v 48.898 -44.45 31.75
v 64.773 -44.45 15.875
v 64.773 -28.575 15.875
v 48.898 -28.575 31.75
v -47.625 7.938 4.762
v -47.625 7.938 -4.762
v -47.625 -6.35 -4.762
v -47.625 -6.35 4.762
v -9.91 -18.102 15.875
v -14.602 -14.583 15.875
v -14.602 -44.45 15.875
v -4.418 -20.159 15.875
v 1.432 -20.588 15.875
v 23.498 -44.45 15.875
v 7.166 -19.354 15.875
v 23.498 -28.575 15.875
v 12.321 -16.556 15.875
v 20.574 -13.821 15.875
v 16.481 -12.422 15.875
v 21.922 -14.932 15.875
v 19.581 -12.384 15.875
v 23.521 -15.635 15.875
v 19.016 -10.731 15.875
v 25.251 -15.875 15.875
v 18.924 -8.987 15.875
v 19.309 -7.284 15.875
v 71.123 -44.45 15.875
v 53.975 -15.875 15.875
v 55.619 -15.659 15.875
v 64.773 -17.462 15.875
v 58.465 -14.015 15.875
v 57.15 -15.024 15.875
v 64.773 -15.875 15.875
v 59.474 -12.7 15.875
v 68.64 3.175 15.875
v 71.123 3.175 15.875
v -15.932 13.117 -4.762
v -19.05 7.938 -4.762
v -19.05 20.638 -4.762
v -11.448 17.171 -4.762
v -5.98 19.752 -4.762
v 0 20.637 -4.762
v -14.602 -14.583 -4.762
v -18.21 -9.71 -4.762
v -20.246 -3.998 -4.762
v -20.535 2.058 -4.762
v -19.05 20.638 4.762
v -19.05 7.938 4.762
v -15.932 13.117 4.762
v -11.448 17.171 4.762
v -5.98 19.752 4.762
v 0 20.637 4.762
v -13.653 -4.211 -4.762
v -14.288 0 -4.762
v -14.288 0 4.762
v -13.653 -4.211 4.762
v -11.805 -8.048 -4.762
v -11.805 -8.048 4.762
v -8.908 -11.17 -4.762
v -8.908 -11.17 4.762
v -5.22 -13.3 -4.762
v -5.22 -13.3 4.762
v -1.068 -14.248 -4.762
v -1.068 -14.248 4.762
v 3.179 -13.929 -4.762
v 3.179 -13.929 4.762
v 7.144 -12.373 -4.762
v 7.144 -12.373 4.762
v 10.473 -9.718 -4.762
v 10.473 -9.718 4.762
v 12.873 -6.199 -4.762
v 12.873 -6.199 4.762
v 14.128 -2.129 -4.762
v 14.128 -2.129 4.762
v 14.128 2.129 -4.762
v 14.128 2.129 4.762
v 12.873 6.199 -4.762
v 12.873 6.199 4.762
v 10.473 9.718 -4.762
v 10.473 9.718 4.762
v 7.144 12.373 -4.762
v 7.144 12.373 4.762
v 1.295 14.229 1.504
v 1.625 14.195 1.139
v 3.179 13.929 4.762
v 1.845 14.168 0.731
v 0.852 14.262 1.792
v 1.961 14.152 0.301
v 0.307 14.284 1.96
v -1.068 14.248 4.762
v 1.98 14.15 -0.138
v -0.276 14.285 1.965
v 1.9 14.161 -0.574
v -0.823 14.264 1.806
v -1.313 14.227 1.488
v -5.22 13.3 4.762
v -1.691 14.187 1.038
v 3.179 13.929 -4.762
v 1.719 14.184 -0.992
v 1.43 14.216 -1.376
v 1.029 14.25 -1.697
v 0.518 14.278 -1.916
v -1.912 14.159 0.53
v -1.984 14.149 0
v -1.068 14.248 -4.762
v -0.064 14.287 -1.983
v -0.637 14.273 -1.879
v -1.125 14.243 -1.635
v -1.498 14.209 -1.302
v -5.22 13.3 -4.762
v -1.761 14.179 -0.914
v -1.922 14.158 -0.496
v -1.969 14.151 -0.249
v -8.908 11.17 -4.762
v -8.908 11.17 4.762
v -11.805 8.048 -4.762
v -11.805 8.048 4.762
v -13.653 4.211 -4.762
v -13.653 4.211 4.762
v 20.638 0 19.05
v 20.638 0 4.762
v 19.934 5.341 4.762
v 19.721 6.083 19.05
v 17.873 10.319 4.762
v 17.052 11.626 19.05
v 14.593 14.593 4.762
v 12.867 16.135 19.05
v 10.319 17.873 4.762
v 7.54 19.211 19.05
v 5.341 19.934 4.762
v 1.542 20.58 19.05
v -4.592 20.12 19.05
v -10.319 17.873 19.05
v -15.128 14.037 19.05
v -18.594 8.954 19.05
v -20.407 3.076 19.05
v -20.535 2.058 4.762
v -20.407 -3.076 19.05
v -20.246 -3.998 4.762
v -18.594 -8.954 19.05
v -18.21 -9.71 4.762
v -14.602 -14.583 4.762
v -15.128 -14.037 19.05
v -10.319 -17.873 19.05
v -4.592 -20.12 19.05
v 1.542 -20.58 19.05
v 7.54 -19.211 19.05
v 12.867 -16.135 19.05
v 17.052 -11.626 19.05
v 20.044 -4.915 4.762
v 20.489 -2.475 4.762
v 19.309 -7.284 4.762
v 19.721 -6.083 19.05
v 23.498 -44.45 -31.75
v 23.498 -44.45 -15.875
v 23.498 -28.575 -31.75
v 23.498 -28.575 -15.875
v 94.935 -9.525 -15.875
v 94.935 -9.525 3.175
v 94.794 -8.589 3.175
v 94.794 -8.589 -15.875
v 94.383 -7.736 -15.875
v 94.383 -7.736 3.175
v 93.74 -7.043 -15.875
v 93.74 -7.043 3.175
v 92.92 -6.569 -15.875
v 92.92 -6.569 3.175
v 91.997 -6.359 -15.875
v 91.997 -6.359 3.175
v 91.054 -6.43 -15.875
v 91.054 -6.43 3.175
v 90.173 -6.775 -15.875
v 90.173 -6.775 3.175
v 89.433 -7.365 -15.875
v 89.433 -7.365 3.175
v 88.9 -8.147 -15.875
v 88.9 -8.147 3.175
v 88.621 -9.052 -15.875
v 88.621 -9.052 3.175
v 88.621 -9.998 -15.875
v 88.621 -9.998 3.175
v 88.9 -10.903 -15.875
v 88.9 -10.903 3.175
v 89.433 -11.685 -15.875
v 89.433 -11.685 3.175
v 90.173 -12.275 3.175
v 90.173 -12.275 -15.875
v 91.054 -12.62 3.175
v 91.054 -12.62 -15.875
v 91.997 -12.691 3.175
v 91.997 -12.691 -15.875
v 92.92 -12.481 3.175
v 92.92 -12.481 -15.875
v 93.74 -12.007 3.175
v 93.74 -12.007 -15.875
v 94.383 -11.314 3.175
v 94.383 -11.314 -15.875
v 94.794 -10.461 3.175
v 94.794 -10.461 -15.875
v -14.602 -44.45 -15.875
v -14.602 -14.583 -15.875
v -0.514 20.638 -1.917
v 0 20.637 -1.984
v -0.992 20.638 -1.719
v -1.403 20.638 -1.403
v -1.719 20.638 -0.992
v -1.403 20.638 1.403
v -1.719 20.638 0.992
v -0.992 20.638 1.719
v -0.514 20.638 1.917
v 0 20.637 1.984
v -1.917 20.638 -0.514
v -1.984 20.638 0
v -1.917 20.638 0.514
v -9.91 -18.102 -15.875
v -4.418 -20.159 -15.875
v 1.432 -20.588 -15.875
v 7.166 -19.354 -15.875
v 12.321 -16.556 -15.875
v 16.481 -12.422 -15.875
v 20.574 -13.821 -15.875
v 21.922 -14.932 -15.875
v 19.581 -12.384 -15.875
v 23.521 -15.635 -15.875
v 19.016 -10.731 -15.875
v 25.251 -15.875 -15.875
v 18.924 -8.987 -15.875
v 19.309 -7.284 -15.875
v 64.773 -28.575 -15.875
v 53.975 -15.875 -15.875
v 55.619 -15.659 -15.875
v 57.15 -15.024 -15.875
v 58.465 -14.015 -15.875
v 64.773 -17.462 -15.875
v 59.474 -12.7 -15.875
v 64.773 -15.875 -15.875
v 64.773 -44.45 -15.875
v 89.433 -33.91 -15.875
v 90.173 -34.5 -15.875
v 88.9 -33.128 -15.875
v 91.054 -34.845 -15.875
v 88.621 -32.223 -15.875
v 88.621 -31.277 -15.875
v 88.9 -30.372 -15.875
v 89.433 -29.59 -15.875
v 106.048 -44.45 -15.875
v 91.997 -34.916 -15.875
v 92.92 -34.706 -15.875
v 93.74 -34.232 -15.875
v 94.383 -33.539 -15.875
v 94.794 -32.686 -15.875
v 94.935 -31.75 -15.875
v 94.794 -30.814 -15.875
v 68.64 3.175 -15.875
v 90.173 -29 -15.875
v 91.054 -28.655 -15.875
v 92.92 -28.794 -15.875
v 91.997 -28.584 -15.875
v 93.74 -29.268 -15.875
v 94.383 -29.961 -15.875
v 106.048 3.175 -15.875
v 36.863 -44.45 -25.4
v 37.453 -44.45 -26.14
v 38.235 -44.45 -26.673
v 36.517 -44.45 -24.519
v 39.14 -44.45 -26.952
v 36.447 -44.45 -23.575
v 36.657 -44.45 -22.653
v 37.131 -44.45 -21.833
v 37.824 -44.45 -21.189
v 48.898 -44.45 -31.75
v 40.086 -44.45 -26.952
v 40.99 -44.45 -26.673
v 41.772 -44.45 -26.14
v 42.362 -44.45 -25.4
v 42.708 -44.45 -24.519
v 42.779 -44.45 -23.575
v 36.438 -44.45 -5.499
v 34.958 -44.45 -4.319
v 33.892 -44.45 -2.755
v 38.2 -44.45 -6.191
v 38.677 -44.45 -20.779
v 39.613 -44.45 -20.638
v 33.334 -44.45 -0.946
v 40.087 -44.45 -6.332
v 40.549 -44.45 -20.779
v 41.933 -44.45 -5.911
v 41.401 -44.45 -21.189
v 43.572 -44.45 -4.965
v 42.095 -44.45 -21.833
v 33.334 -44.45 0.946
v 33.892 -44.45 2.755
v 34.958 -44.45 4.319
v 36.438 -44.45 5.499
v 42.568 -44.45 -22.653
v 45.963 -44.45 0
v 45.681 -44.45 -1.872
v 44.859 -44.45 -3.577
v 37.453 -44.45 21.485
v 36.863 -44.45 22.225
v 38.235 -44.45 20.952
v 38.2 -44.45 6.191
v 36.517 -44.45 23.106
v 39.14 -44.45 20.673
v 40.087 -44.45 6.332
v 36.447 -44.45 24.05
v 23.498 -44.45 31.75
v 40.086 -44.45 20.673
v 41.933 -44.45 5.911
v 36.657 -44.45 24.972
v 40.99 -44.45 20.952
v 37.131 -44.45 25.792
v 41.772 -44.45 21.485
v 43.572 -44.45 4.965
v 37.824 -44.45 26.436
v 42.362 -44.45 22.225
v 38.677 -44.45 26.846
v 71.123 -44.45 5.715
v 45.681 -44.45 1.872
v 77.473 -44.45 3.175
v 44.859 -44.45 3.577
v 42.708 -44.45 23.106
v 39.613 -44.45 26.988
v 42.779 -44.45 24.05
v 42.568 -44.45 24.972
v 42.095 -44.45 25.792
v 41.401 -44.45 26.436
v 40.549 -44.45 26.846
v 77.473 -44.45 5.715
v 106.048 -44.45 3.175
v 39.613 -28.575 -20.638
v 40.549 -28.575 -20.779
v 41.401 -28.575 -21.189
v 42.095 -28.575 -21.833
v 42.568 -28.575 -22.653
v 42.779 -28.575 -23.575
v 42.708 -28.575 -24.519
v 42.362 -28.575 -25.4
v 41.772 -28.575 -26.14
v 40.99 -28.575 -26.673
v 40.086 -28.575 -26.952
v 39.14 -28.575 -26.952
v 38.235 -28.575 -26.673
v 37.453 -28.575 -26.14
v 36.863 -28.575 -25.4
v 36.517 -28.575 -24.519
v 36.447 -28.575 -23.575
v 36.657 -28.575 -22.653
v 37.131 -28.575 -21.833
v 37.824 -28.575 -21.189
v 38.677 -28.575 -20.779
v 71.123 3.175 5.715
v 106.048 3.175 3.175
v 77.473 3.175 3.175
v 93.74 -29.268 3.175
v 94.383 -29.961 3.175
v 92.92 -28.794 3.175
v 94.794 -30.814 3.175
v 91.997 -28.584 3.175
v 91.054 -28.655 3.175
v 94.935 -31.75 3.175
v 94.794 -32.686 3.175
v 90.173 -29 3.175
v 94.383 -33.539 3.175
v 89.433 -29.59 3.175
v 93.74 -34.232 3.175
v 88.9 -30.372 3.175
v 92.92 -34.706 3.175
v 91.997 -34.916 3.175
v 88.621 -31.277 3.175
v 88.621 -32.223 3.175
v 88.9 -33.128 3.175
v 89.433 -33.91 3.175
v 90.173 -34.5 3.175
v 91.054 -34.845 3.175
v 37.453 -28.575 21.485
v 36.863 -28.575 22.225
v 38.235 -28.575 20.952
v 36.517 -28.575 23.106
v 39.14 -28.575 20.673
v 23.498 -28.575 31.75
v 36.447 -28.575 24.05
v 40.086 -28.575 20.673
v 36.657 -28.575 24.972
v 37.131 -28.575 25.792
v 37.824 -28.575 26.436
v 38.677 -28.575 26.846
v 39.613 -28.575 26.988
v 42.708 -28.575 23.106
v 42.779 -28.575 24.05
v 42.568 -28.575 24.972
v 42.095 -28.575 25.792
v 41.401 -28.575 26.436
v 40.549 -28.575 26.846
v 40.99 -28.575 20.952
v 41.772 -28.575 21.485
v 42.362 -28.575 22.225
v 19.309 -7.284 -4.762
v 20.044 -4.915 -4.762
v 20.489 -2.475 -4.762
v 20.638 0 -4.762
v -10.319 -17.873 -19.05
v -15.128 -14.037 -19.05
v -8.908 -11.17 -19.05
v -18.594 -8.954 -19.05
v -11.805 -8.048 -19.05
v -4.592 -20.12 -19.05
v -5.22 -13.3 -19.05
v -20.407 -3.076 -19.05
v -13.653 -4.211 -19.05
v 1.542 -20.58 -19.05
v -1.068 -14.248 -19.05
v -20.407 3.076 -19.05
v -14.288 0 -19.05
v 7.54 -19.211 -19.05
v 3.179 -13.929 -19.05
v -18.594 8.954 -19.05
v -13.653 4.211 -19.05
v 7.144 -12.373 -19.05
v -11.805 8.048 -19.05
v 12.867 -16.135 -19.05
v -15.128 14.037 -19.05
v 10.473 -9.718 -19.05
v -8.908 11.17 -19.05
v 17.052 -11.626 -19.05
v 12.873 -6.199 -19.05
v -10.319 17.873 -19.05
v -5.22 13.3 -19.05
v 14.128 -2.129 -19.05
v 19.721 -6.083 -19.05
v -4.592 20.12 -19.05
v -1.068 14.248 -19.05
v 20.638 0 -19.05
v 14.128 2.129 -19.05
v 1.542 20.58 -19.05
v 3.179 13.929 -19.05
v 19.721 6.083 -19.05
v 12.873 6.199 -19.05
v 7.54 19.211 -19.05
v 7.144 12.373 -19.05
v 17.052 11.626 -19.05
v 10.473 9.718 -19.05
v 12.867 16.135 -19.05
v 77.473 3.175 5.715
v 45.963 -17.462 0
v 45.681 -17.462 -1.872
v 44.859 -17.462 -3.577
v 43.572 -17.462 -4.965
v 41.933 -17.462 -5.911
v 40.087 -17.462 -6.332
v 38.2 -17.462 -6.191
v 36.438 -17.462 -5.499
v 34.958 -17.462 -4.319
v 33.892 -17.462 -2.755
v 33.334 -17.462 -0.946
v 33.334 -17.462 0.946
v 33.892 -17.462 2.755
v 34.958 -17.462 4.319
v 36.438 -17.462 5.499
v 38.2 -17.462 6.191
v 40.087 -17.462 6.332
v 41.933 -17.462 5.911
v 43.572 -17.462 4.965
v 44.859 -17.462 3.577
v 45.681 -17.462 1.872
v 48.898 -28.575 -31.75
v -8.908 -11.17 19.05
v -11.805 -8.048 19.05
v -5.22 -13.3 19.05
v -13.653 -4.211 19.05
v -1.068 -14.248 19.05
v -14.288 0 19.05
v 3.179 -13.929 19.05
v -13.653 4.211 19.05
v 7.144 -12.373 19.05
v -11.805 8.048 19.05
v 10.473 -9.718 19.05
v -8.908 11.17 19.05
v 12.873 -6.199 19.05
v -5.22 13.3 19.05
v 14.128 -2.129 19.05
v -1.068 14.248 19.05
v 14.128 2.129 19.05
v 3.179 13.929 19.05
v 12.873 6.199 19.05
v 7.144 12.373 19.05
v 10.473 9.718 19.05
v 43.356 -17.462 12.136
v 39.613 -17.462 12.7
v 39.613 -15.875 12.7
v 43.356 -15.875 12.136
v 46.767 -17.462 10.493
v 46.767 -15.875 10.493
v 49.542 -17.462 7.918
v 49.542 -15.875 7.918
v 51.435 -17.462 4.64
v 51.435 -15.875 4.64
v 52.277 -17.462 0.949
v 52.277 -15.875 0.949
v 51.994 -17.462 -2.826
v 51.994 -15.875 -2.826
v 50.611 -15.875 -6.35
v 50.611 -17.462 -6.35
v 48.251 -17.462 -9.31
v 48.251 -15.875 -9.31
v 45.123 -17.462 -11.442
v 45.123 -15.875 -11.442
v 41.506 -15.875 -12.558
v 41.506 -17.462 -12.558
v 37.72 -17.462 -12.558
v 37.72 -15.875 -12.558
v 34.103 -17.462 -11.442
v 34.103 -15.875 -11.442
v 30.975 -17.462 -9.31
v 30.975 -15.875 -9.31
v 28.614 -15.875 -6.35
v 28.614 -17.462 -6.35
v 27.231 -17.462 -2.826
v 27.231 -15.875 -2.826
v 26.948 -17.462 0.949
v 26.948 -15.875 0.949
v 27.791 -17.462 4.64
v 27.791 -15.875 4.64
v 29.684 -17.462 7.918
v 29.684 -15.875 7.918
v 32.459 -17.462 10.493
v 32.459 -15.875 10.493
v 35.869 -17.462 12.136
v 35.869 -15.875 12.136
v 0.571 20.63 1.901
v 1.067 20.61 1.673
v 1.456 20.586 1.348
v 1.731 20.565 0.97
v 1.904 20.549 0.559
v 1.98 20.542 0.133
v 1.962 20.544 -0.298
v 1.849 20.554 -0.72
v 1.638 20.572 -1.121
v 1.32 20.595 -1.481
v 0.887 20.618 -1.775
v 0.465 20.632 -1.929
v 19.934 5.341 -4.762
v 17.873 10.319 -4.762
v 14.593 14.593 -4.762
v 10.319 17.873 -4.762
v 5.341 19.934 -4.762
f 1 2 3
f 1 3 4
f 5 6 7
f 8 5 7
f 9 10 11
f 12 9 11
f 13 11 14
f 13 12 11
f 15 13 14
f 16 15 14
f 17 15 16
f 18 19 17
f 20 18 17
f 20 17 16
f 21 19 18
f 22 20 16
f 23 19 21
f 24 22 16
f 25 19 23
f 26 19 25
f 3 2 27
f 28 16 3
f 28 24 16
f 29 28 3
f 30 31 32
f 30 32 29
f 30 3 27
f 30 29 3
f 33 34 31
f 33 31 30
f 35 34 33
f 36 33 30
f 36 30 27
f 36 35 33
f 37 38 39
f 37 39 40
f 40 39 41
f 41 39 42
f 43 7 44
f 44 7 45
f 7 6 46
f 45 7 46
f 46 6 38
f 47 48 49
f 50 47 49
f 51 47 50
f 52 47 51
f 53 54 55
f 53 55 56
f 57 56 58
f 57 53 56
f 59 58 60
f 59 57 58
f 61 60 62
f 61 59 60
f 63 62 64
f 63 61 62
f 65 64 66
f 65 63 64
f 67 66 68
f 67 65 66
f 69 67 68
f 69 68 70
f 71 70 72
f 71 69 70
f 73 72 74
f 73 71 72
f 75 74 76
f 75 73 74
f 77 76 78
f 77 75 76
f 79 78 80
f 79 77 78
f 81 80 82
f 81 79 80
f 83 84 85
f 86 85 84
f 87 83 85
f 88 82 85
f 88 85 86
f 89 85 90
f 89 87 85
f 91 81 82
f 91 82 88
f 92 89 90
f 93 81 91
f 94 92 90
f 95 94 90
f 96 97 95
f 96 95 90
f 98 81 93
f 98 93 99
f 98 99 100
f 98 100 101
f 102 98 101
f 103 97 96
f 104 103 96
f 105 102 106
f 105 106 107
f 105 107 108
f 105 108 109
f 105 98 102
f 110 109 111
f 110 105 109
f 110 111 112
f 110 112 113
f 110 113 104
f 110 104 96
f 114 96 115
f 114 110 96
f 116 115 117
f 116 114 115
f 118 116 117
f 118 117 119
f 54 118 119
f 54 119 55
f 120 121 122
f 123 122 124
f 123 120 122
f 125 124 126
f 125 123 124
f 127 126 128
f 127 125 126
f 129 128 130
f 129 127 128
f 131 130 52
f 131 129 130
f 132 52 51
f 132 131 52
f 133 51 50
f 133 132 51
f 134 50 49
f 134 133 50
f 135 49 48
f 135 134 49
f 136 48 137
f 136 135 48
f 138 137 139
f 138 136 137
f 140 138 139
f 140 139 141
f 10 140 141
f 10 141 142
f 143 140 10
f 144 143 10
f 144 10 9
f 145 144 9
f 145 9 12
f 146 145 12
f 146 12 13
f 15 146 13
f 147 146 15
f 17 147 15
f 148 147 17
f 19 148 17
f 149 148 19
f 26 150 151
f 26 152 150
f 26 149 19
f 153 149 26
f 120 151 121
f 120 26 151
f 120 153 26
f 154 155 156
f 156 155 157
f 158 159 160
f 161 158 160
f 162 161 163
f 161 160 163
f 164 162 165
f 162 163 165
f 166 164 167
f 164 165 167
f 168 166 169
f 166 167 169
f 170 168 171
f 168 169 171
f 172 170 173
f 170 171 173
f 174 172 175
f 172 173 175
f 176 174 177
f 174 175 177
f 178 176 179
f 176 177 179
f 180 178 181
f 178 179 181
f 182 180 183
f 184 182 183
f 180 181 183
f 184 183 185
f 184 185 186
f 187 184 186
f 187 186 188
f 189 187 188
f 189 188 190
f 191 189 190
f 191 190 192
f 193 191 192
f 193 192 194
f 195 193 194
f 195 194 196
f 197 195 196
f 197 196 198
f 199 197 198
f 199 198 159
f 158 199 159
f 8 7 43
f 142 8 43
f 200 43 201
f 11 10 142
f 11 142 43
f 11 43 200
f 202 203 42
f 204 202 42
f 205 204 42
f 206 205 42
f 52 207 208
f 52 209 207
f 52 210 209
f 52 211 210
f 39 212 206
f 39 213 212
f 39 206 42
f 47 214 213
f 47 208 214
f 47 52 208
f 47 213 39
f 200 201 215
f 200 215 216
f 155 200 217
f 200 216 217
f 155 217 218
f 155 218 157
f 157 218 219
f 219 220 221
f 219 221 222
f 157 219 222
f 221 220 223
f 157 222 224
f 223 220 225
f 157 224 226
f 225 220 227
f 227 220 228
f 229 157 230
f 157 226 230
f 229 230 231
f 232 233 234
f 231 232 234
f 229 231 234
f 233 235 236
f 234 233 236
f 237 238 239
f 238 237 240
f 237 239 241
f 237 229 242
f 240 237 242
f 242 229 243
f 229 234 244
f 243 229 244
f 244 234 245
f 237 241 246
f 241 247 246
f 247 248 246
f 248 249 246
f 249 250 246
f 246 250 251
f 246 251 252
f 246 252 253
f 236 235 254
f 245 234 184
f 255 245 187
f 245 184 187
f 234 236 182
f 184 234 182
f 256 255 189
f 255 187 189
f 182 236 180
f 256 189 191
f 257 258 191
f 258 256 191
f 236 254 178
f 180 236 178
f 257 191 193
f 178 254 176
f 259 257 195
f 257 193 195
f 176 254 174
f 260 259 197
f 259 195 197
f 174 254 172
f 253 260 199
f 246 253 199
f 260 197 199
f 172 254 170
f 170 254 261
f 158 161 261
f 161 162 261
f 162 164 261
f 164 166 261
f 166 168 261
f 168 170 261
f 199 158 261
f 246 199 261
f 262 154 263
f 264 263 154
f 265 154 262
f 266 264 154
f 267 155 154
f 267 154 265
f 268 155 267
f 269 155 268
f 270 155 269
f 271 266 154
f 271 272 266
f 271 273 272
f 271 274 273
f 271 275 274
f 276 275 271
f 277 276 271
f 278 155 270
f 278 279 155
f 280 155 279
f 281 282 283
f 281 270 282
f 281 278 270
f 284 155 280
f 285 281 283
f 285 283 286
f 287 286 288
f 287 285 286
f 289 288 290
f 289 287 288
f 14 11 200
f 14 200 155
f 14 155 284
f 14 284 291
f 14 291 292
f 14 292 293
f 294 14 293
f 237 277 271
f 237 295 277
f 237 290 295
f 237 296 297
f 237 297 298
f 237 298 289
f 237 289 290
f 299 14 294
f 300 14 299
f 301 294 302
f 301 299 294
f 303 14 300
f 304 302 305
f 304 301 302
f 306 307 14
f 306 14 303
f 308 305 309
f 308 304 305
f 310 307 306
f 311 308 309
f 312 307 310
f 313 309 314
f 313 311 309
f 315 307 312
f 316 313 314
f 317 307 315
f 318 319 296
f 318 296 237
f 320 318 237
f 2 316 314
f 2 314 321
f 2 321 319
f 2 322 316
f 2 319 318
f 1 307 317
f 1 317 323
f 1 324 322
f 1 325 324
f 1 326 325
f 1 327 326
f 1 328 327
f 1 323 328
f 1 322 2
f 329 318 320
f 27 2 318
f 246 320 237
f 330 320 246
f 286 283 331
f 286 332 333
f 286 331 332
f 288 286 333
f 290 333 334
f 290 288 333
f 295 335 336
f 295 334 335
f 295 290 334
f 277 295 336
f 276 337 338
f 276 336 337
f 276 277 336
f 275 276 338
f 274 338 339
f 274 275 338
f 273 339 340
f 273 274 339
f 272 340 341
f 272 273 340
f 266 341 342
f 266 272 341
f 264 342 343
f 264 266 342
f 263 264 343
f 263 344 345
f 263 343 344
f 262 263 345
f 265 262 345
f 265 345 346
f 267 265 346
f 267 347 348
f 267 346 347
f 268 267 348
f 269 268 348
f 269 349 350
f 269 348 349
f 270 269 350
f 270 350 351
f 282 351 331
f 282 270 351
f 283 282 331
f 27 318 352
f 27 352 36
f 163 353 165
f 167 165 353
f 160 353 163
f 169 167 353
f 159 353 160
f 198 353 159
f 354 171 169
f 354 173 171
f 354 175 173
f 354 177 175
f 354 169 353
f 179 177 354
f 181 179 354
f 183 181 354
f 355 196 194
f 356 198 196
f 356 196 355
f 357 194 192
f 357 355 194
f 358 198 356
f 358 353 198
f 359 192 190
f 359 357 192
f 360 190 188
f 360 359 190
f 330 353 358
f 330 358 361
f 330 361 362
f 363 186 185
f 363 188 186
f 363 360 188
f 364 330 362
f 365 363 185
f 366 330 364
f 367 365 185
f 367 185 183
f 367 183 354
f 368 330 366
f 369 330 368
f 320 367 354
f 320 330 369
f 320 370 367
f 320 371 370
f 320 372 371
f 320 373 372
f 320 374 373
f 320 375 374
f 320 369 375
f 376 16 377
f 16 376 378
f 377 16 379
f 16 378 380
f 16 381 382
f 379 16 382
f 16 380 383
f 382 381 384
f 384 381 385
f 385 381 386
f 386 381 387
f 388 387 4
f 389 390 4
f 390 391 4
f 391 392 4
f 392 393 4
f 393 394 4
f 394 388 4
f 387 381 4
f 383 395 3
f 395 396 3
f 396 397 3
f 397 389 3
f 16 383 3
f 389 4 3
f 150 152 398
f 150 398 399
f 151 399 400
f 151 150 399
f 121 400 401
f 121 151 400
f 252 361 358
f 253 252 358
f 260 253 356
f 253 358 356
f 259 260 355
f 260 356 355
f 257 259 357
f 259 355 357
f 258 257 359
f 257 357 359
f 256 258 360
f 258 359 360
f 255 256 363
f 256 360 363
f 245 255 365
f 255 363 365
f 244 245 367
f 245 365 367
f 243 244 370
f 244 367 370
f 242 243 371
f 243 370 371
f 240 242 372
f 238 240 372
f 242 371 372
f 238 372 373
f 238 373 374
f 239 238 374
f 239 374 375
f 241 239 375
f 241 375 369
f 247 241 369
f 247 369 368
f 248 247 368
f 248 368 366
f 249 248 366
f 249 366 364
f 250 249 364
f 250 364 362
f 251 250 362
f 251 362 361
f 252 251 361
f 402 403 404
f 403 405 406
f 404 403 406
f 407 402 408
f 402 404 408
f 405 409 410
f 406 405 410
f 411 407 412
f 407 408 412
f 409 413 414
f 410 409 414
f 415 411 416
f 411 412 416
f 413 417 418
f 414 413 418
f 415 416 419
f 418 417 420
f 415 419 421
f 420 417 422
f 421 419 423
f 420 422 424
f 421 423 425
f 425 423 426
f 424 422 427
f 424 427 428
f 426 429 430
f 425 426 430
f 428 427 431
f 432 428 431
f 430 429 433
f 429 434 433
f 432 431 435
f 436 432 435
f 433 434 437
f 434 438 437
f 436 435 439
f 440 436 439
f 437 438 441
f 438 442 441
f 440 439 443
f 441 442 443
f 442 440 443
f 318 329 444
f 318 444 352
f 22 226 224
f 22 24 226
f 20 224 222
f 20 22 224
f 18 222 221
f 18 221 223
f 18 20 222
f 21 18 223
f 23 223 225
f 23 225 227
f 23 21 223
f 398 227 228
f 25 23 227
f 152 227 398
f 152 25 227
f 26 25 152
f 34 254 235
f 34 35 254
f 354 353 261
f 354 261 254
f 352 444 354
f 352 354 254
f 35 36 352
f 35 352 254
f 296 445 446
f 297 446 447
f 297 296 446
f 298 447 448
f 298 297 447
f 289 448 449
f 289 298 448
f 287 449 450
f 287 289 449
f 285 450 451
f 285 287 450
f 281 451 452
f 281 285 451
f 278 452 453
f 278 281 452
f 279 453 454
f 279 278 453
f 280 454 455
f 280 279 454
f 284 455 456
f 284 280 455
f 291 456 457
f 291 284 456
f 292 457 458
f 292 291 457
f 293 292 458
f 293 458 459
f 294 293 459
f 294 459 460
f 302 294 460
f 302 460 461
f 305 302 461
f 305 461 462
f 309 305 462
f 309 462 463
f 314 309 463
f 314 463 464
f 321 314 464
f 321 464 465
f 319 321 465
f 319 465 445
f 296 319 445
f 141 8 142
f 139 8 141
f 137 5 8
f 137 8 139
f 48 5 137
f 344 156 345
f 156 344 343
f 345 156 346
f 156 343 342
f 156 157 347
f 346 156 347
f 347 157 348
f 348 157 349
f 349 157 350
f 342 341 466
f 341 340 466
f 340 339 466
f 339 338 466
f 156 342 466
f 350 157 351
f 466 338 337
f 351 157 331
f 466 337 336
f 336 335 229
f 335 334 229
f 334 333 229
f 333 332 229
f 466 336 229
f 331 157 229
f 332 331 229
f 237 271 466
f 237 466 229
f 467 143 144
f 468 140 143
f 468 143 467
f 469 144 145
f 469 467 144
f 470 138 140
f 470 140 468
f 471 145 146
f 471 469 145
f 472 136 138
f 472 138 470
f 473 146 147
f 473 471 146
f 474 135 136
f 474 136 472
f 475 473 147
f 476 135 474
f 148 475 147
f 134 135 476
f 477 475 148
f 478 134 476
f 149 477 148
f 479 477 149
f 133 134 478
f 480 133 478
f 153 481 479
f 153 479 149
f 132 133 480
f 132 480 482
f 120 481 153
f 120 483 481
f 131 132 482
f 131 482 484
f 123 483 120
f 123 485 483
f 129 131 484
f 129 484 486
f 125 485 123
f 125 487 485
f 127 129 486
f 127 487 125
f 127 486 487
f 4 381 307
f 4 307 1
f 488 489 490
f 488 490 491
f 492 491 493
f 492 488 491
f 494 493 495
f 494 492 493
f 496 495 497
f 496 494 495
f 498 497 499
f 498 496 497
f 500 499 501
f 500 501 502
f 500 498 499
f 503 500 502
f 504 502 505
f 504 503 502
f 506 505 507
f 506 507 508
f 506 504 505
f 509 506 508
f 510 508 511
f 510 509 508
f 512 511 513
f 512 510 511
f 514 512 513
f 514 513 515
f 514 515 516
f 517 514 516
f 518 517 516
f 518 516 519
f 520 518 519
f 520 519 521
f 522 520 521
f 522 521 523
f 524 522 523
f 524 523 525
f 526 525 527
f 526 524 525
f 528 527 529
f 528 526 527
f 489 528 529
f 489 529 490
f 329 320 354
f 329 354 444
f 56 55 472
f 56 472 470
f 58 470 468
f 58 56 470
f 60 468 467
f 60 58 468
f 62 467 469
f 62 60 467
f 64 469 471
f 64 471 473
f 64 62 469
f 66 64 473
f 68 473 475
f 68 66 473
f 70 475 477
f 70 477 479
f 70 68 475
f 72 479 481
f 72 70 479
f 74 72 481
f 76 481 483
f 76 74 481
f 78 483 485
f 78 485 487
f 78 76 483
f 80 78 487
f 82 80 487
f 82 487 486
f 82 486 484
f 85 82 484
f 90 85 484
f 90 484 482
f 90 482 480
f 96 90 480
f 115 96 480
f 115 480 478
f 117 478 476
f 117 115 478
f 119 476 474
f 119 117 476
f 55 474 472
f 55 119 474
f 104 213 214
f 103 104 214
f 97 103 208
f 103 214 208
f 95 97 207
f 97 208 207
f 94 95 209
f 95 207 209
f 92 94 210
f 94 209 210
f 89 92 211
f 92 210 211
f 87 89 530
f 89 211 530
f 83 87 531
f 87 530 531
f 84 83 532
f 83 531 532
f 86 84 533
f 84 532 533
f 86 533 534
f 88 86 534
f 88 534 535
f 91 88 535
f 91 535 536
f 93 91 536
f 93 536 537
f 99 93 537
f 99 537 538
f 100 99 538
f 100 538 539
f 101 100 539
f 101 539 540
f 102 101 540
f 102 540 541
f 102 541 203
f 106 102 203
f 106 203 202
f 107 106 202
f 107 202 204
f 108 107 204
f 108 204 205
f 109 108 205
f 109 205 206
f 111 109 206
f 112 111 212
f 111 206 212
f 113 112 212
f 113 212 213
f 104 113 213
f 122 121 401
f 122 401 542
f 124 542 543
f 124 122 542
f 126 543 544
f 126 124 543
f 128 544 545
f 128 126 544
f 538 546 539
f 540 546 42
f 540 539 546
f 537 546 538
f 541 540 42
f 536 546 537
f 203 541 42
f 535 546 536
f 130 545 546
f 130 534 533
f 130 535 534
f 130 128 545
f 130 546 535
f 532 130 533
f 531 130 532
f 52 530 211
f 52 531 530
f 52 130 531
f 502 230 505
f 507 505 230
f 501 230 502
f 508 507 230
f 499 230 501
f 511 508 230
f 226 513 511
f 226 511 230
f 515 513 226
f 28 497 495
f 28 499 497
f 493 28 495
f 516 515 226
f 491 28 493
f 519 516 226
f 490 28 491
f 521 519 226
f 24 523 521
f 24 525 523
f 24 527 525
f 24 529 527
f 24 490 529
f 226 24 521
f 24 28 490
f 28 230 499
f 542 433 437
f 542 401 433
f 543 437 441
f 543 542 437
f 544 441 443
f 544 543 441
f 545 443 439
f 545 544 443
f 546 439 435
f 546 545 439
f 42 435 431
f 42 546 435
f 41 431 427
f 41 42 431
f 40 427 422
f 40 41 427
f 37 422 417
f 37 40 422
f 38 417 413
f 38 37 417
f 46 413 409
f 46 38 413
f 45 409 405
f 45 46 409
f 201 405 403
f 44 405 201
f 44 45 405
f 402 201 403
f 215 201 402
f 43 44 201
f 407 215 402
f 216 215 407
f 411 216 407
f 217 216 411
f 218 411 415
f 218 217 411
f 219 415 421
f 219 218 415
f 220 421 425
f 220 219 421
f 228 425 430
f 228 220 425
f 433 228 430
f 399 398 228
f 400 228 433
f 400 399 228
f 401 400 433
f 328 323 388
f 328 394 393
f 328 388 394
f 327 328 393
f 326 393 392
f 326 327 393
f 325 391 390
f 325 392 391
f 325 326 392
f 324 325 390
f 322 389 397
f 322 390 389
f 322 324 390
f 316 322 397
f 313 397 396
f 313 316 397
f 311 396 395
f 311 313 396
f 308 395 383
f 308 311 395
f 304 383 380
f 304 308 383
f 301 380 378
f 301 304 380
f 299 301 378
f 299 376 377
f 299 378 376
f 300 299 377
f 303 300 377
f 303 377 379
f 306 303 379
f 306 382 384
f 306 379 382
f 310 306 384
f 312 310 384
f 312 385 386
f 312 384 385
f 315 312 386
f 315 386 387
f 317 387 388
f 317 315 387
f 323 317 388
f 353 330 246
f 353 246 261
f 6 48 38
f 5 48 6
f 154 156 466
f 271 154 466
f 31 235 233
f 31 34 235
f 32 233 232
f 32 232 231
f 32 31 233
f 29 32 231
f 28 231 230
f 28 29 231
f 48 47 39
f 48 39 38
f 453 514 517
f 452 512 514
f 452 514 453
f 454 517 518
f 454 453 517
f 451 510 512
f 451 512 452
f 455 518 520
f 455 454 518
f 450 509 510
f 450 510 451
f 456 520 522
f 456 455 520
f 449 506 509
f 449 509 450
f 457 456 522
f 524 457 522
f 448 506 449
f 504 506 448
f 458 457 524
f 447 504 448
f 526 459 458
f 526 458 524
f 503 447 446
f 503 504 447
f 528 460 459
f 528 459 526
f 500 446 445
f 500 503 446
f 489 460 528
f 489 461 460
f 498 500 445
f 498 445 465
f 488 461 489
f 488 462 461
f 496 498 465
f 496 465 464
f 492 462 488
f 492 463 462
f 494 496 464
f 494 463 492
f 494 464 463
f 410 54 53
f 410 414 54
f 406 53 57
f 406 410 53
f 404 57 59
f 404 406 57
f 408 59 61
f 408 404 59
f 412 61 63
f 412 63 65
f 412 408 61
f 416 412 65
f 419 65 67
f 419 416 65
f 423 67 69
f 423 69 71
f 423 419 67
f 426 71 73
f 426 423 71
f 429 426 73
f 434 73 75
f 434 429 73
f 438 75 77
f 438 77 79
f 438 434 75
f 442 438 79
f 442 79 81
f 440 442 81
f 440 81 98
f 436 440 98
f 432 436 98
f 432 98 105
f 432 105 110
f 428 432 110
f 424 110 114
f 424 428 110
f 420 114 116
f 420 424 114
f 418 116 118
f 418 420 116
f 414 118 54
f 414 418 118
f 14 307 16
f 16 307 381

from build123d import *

# Parameters (mm, degrees)
SKETCH1_R               = 20.6375
SKETCH1_R_2             = 14.2875
SKETCH1_W               = 41.275
SKETCH1_H               = 15.875
BOSS_EXTRUDE1_DEPTH     = 4.7625
SKETCH1_5_R             = 20.6375
SKETCH1_5_R_2           = 14.2875
BOSS_EXTRUDE2_DEPTH     = 19.05
SKETCH1_6_W             = 41.275
SKETCH1_6_H             = 15.875
BOSS_EXTRUDE3_DEPTH     = 15.875
SKETCH1_7_W             = 41.275
SKETCH1_7_H             = 15.875
BOSS_EXTRUDE4_DEPTH     = 31.75
CUT_EXTRUDE1_START      = -28.575
CUT_EXTRUDE1_OUTLINE_R  = 6.35
CUT_EXTRUDE1_DEPTH      = 47.625
CUT_EXTRUDE4_START      = -1.5875
SKETCH2_5_R             = 12.7
SKETCH2_5_R_2           = 6.35
CUT_EXTRUDE4_DEPTH      = 1.5875
CUT_EXTRUDE5_DEPTH      = 122.144687625
CUT_EXTRUDE5_DEPTH_BACK = 122.144687625
SKETCH3_R               = 3.175
SKETCH4_R               = 3.175
CUT_EXTRUDE6_DEPTH      = 121.173461332
CUT_EXTRUDE7_REACH      = 130.416
CUT_EXTRUDE7_END_RADIUS = 14.2875
SKETCH5_R               = 1.984375


# Read off the part's stored shape, not the designer's step: Cut-Extrude1
with BuildPart() as part:
    # Sketch1 → Boss-Extrude1 (new, symmetric)
    # profile 1 of 5: a face of its own
    with BuildSketch(Plane.XY):
        with BuildLine():
            ThreePointArc((25.250733281, -15.875), (20.027995944, -13.136857515), (19.309384274, -7.283823529))
            ThreePointArc((19.309384274, -7.283823529), (4.342837348, -20.175385251), (-14.60235654, -14.583469742))
            Line((-14.60235654, -14.583469742), (-14.60235654, -44.45))
            Line((-14.60235654, -44.45), (23.49764346, -44.45))
            Line((23.49764346, -44.45), (23.49764346, -28.575))
            Line((23.49764346, -28.575), (64.77264346, -28.575))
            Line((64.77264346, -28.575), (64.77264346, -44.45))
            Line((64.77264346, -44.45), (106.04764346, -44.45))
            Line((106.04764346, -44.45), (106.04764346, 3.175))
            Line((106.04764346, 3.175), (68.639696837, 3.175))
            Line((68.639696837, 3.175), (59.474261314, -12.7))
            ThreePointArc((59.474261314, -12.7), (57.15, -15.024261314), (53.975, -15.875))
            Line((53.975, -15.875), (25.250733281, -15.875))
        make_face()
    # profile 2 of 5: a face of its own
    with BuildSketch(Plane.XY):
        Circle(SKETCH1_R)
        with Locations(Location((0, 0, 0), (0, 0, 180))):
            Circle(SKETCH1_R_2, mode=Mode.SUBTRACT)
    # profile 3 of 5: a face of its own
    with BuildSketch(Plane.XY):
        with BuildLine():
            ThreePointArc((-14.60235654, -14.583469742), (-20.24645141, -3.998451143), (-19.05, 7.9375))
            Line((-19.05, 7.9375), (-47.625, 7.9375))
            Line((-47.625, 7.9375), (-47.625, -6.35))
            Line((-47.625, -6.35), (-14.60235654, -14.583469742))
        make_face()
    # profile 4 of 5: a face of its own
    with BuildSketch(Plane.XY):
        with Locations((44.13514346, -36.5125)):
            Rectangle(SKETCH1_W, SKETCH1_H)
    # profile 5 of 5: a face of its own
    with BuildSketch(Plane.XY):
        with BuildLine():
            ThreePointArc((-19.05, 7.9375), (-11.4476253, 17.171437949), (0, 20.6375))
            Line((0, 20.6375), (-19.05, 20.6375))
            Line((-19.05, 20.6375), (-19.05, 7.9375))
        make_face()
    extrude(amount=BOSS_EXTRUDE1_DEPTH, both=True)

    # Sketch1<5> → Boss-Extrude2 (add, symmetric)
    with BuildSketch(Plane.XY):
        Circle(SKETCH1_5_R)
        with Locations(Location((0, 0, 0), (0, 0, 180))):
            Circle(SKETCH1_5_R_2, mode=Mode.SUBTRACT)
    extrude(amount=BOSS_EXTRUDE2_DEPTH, both=True)

    # Sketch1<6> → Boss-Extrude3 (add, symmetric)
    with BuildSketch(Plane.XY):
        with BuildLine():
            ThreePointArc((25.250733281, -15.875), (20.027995944, -13.136857515), (19.309384274, -7.283823529))
            ThreePointArc((19.309384274, -7.283823529), (4.342837348, -20.175385251), (-14.60235654, -14.583469742))
            Line((-14.60235654, -14.583469742), (-14.60235654, -44.45))
            Line((-14.60235654, -44.45), (23.49764346, -44.45))
            Line((23.49764346, -44.45), (23.49764346, -28.575))
            Line((23.49764346, -28.575), (64.77264346, -28.575))
            Line((64.77264346, -28.575), (64.77264346, -44.45))
            Line((64.77264346, -44.45), (106.04764346, -44.45))
            Line((106.04764346, -44.45), (106.04764346, 3.175))
            Line((106.04764346, 3.175), (68.639696837, 3.175))
            Line((68.639696837, 3.175), (59.474261314, -12.7))
            ThreePointArc((59.474261314, -12.7), (57.15, -15.024261314), (53.975, -15.875))
            Line((53.975, -15.875), (25.250733281, -15.875))
        make_face()
        with Locations((44.13514346, -36.5125)):
            Rectangle(SKETCH1_6_W, SKETCH1_6_H)
    extrude(amount=BOSS_EXTRUDE3_DEPTH, both=True)

    # Sketch1<7> → Boss-Extrude4 (add, symmetric)
    with BuildSketch(Plane.XY):
        with Locations((44.13514346, -36.5125)):
            Rectangle(SKETCH1_7_W, SKETCH1_7_H)
    extrude(amount=BOSS_EXTRUDE4_DEPTH, both=True)

    # Cut-Extrude1 outline → Cut-Extrude1 (cut)
    with BuildSketch(Plane(origin=(0, -15.875, 0), x_dir=(1, 0, 0), z_dir=(0, 1, 0)).offset(CUT_EXTRUDE1_START)):
        with Locations((39.612866641, 0)):
            Circle(CUT_EXTRUDE1_OUTLINE_R)
        Polygon((71.12264346, -5.715), (71.12264346, -15.875), (106.04764346, -15.875), (106.04764346, -3.175), (77.47264346, -3.175), (77.47264346, -5.715), align=None)
        Polygon((64.77264346, -15.875), (48.89764346, -31.75), (64.77264346, -31.75), align=None)
        Polygon((64.77264346, 31.75), (48.89764346, 31.75), (64.77264346, 15.875), align=None)
    extrude(amount=CUT_EXTRUDE1_DEPTH, mode=Mode.SUBTRACT)

    # Sketch2<5> → Cut-Extrude4 (cut)
    # profile 1 of 4: a face of its own
    with BuildSketch(Plane(origin=(0, -15.875, 0), x_dir=(1, 0, 0), z_dir=(0, 1, 0)).offset(CUT_EXTRUDE4_START)):
        with Locations(Location((39.612866641, 0, 0), (0, 0, 270))):
            Circle(SKETCH2_5_R)
        with Locations(Location((39.612866641, 0, 0), (0, 0, 270))):
            Circle(SKETCH2_5_R_2, mode=Mode.SUBTRACT)
    # profile 2 of 4: a face of its own
    with BuildSketch(Plane(origin=(0, -15.875, 0), x_dir=(1, 0, 0), z_dir=(0, 1, 0)).offset(CUT_EXTRUDE4_START)):
        Polygon((48.89764346, -31.75), (64.77264346, -15.875), (64.77264346, -31.75), align=None)
    # profile 3 of 4: a face of its own
    with BuildSketch(Plane(origin=(0, -15.875, 0), x_dir=(1, 0, 0), z_dir=(0, 1, 0)).offset(CUT_EXTRUDE4_START)):
        Polygon((64.77264346, 31.75), (48.89764346, 31.75), (64.77264346, 15.875), align=None)
    # profile 4 of 4: a face of its own
    with BuildSketch(Plane(origin=(0, -15.875, 0), x_dir=(1, 0, 0), z_dir=(0, 1, 0)).offset(CUT_EXTRUDE4_START)):
        Polygon((106.04764346, -3.175), (77.47264346, -3.175), (77.47264346, -5.715), (71.12264346, -5.715), (71.12264346, -15.875), (106.04764346, -15.875), align=None)
    extrude(amount=CUT_EXTRUDE4_DEPTH, mode=Mode.SUBTRACT)

    # Sketch3 → Cut-Extrude5 (cut, two sides: drawn at the far end of the back side and taken through both)
    with BuildSketch(Plane(origin=(0, -28.575, 0), x_dir=(1, 0, 0), z_dir=(0, 1, 0)).offset(-CUT_EXTRUDE5_DEPTH_BACK)):
        with Locations(Location((39.612866641, 23.8125, 0), (0, 0, 270))):
            Circle(SKETCH3_R)
        with Locations(Location((39.612866641, -23.8125, 0), (0, 0, 270))):
            Circle(SKETCH3_R)
    extrude(amount=CUT_EXTRUDE5_DEPTH + CUT_EXTRUDE5_DEPTH_BACK, mode=Mode.SUBTRACT)

    # Sketch4 → Cut-Extrude6 (cut, through all)
    with BuildSketch(Plane.XY.offset(3.175)):
        with Locations((91.76014346, -9.525)):
            Circle(SKETCH4_R)
        with Locations((91.76014346, -31.75)):
            Circle(SKETCH4_R)
    extrude(amount=-CUT_EXTRUDE6_DEPTH, mode=Mode.SUBTRACT)

    # Cut-Extrude7: up to this cylinder (the profile starts outside it)
    cut_extrude7_end = Plane(origin=(0, 0, 0), z_dir=(0, 0, -1)) * Cylinder(CUT_EXTRUDE7_END_RADIUS, 290.407, mode=Mode.PRIVATE)
    # Sketch5 → Cut-Extrude7 (cut, up to the surface)
    with BuildSketch(Plane(origin=(0, 20.6375, 0), x_dir=(1, 0, 0), z_dir=(0, 1, 0)), mode=Mode.PRIVATE) as cut_extrude7_sk1:
        with Locations(Location((0, 0, 0), (0, 0, 180))):
            Circle(SKETCH5_R)
    cut_extrude7_tool1 = extrude(cut_extrude7_sk1.sketch, amount=-CUT_EXTRUDE7_REACH, mode=Mode.PRIVATE) - cut_extrude7_end
    add(cut_extrude7_tool1.solids().sort_by_distance((0, 20.6375, 0))[0], mode=Mode.SUBTRACT)


solid = part.part
